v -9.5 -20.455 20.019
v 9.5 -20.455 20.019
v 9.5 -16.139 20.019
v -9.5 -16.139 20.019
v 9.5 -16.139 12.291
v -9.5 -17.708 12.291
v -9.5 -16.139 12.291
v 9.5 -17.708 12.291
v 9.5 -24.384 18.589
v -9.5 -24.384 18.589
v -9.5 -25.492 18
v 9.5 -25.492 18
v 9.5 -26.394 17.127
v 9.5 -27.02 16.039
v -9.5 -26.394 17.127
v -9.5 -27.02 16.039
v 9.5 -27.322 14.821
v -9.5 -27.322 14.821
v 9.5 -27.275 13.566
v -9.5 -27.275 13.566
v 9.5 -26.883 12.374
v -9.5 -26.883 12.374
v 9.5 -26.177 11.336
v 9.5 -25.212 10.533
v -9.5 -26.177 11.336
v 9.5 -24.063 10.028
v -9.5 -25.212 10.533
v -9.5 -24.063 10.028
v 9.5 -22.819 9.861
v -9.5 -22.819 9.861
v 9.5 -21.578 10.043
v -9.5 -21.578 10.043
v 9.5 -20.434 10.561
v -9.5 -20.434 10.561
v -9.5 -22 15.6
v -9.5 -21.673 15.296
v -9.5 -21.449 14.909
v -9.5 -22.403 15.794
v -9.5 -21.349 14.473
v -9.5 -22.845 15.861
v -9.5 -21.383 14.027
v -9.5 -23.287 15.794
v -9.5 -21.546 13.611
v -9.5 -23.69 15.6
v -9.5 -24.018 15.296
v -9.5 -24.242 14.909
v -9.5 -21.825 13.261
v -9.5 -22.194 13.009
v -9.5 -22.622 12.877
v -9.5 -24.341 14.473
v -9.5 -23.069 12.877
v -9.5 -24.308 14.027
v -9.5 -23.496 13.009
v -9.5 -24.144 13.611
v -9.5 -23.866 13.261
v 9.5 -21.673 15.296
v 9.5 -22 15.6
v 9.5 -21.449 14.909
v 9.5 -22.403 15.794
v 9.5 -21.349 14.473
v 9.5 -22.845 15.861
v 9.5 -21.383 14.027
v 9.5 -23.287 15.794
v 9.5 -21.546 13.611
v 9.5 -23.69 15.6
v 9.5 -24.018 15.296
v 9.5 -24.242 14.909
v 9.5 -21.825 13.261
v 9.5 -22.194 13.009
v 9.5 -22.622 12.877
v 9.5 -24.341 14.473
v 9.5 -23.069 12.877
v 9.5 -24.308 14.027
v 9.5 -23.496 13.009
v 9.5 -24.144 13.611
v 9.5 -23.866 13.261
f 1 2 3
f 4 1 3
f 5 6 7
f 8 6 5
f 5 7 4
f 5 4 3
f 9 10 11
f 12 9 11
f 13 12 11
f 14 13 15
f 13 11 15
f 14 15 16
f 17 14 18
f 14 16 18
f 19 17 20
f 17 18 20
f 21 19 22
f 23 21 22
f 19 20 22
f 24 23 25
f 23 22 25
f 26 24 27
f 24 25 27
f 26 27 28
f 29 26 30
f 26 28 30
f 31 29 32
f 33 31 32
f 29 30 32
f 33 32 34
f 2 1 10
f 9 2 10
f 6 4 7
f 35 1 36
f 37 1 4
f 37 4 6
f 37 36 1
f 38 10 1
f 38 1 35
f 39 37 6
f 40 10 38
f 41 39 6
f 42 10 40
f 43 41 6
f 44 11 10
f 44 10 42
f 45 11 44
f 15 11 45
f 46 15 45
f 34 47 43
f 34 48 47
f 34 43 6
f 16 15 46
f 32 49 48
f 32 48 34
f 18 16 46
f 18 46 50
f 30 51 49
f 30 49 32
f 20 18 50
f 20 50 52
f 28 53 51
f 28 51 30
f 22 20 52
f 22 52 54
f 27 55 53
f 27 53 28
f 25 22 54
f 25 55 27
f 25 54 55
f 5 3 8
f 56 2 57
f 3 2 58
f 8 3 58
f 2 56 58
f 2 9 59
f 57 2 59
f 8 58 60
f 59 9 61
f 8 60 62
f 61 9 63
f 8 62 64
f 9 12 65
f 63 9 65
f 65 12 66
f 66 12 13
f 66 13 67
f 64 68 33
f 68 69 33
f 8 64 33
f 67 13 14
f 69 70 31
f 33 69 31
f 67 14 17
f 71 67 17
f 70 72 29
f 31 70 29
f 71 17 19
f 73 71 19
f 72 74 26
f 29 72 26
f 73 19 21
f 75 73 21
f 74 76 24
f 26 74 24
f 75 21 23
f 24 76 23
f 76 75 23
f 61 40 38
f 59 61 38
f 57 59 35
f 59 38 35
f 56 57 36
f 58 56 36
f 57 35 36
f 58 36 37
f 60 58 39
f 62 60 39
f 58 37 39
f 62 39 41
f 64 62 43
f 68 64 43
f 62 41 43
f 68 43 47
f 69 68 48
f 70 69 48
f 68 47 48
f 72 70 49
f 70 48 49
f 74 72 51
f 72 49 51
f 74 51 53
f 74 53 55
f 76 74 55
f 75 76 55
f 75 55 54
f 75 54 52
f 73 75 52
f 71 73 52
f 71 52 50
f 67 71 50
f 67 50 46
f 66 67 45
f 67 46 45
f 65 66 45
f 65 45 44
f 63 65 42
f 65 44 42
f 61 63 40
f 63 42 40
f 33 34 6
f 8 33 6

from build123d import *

# Parameters (mm, degrees)
BOSS_EXTRUDE1_START       = -0.8
BOSS_EXTRUDE1_OUTLINE_R   = 6
BOSS_EXTRUDE1_OUTLINE_R_2 = 2.5
BOSS_EXTRUDE1_DEPTH       = 1
BOSS_EXTRUDE1_START_2     = -9.5
BOSS_EXTRUDE1_2_OUTLINE_R = 2.75
BOSS_EXTRUDE1_2_DEPTH     = 19
BOSS_EXTRUDE1_START_3     = 20.214309477
BOSS_EXTRUDE1_3_OUTLINE_R = 1.25
BOSS_EXTRUDE1_3_DEPTH     = 5
SKETCH2_R                 = 6.25
CUT_EXTRUDE1_DEPTH        = 36.290497761
SKETCH3_R                 = 1.5
CUT_EXTRUDE2_DEPTH        = 10
SKETCH4_R                 = 2.75
SKETCH4_R_2               = 1.5
BOSS_EXTRUDE2_DEPTH       = 19
SKETCH5_W                 = 25.593794746
SKETCH5_H                 = 54.341869273
CUT_EXTRUDE3_DEPTH        = 45.112349032
SKETCH6_W                 = 19
SKETCH6_H                 = 8.728279904
BOSS_EXTRUDE3_DEPTH       = 1.568762114
SKETCH7_W                 = 4.505283746
SKETCH7_H                 = 5.968681608
CUT_EXTRUDE4_DEPTH        = 40.377309908


with BuildPart() as part:
    # Boss-Extrude1: read off the stored shape, not the designer's step
    # Boss-Extrude1 outline → Boss-Extrude1 (new body)
    with BuildSketch(Plane(origin=(0, 0, 24.414309477), x_dir=(-1, 0, 0), z_dir=(0, 0, -1)).offset(BOSS_EXTRUDE1_START)):
        with Locations((0, 13.101553709)):
            Circle(BOSS_EXTRUDE1_OUTLINE_R)
        with Locations((0, 13.101553709)):
            Circle(BOSS_EXTRUDE1_OUTLINE_R_2, mode=Mode.SUBTRACT)
    extrude(amount=BOSS_EXTRUDE1_DEPTH)

    # Boss-Extrude1 2 outline → Boss-Extrude1 2 (add)
    with BuildSketch(Plane.YZ.offset(BOSS_EXTRUDE1_START_2)):
        with BuildLine():
            Line((30.808082296, 25.214309477), (-4.594884555, 25.214309477))
            ThreePointArc((-4.594884555, 25.214309477), (-6.157718154, 25.077579254), (-7.673065845, 24.671543064))
            Line((-7.673065845, 24.671543064), (-24.384342131, 18.58913592))
            ThreePointArc((-24.384342131, 18.58913592), (-26.882991431, 12.373899853), (-20.43432651, 10.560855883))
            Line((-20.43432651, 10.560855883), (-7.673065845, 18.658005573))
            ThreePointArc((-7.673065845, 18.658005573), (-5.104992299, 19.817354852), (-2.315454789, 20.214309477))
            Line((-2.315454789, 20.214309477), (30.808082296, 20.214309477))
            Line((30.808082296, 20.214309477), (30.808082296, 25.214309477))
        make_face()
        with Locations((-22.845251486, 14.360519126)):
            Circle(BOSS_EXTRUDE1_2_OUTLINE_R, mode=Mode.SUBTRACT)
    extrude(amount=BOSS_EXTRUDE1_2_DEPTH)

    # Boss-Extrude1 3 outline → Boss-Extrude1 3 (cut)
    with BuildSketch(Plane.XY.offset(BOSS_EXTRUDE1_START_3)):
        with BuildLine():
            ThreePointArc((-9.5, 25.808082296), (-8.035533906, 29.343616202), (-4.5, 30.808082296))
            Line((-4.5, 30.808082296), (-9.5, 30.808082296))
            Line((-9.5, 30.808082296), (-9.5, 25.808082296))
        make_face()
        with BuildLine():
            Line((9.5, 30.808082296), (4.5, 30.808082296))
            ThreePointArc((4.5, 30.808082296), (8.035533906, 29.343616202), (9.5, 25.808082296))
            Line((9.5, 25.808082296), (9.5, 30.808082296))
        make_face()
        with Locations((5, 26.808082296)):
            Circle(BOSS_EXTRUDE1_3_OUTLINE_R)
        with Locations((-5, 26.808082296)):
            Circle(BOSS_EXTRUDE1_3_OUTLINE_R)
    extrude(amount=BOSS_EXTRUDE1_3_DEPTH, mode=Mode.SUBTRACT)

    # Boss-Extrude1 4 outline → Boss-Extrude1 4 (revolve, cut)
    with BuildSketch(Plane.XZ.offset(-13.101553709)):
        Polygon((6, 20.714309477), (6, 24.214309477), (2.5, 24.214309477), (2.5, 25.214309477), (0, 25.214309477), (0, 20.214309477), (6.5, 20.214309477), align=None)
    revolve(axis=Axis((0, 13.101553709, 0), (0, 0, 1)), mode=Mode.SUBTRACT)

    # Sketch2 → Cut-Extrude1 (cut, through all)
    with BuildSketch(Plane(origin=(0, 0, 24.214309477), x_dir=(-1, 0, 0), z_dir=(0, 0, -1))):
        with Locations((0, 13.101553709)):
            Circle(SKETCH2_R)
    extrude(amount=CUT_EXTRUDE1_DEPTH, mode=Mode.SUBTRACT)

    # Sketch3 → Cut-Extrude2 (cut)
    with BuildSketch(Plane.XY.offset(25.214309477)):
        with Locations((-5, 26.808082296)):
            Circle(SKETCH3_R)
        with Locations((5, 26.808082296)):
            Circle(SKETCH3_R)
    extrude(amount=-CUT_EXTRUDE2_DEPTH, mode=Mode.SUBTRACT)

    # Sketch4 → Boss-Extrude2 (add)
    with BuildSketch(Plane.ZY.offset(9.5)):
        with Locations((14.360519126, -22.845251486)):
            Circle(SKETCH4_R)
        with Locations((14.360519126, -22.845251486)):
            Circle(SKETCH4_R_2, mode=Mode.SUBTRACT)
    extrude(amount=-BOSS_EXTRUDE2_DEPTH)

    # Sketch5 → Cut-Extrude3 (cut, through all)
    with BuildSketch(Plane(origin=(9.5, 0, 0), x_dir=(0, 0, -1), z_dir=(1, 0, 0))):
        with Locations((-21.9386431, 9.463333989)):
            Rectangle(SKETCH5_W, SKETCH5_H)
    extrude(amount=-CUT_EXTRUDE3_DEPTH, mode=Mode.SUBTRACT)

    # Sketch6 → Boss-Extrude3 (add)
    with BuildSketch(Plane(origin=(0, -17.707600648, 0), x_dir=(1, 0, 0), z_dir=(0, 1, 0))):
        with Locations((0, -16.655131129)):
            Rectangle(SKETCH6_W, SKETCH6_H)
    extrude(amount=BOSS_EXTRUDE3_DEPTH)

    # Sketch7 → Cut-Extrude4 (cut, through all)
    with BuildSketch(Plane(origin=(9.5, 0, 0), x_dir=(0, 0, -1), z_dir=(1, 0, 0))):
        with Locations((-22.271912954, -19.123179338)):
            Rectangle(SKETCH7_W, SKETCH7_H)
    extrude(amount=-CUT_EXTRUDE4_DEPTH, mode=Mode.SUBTRACT)


solid = part.part
